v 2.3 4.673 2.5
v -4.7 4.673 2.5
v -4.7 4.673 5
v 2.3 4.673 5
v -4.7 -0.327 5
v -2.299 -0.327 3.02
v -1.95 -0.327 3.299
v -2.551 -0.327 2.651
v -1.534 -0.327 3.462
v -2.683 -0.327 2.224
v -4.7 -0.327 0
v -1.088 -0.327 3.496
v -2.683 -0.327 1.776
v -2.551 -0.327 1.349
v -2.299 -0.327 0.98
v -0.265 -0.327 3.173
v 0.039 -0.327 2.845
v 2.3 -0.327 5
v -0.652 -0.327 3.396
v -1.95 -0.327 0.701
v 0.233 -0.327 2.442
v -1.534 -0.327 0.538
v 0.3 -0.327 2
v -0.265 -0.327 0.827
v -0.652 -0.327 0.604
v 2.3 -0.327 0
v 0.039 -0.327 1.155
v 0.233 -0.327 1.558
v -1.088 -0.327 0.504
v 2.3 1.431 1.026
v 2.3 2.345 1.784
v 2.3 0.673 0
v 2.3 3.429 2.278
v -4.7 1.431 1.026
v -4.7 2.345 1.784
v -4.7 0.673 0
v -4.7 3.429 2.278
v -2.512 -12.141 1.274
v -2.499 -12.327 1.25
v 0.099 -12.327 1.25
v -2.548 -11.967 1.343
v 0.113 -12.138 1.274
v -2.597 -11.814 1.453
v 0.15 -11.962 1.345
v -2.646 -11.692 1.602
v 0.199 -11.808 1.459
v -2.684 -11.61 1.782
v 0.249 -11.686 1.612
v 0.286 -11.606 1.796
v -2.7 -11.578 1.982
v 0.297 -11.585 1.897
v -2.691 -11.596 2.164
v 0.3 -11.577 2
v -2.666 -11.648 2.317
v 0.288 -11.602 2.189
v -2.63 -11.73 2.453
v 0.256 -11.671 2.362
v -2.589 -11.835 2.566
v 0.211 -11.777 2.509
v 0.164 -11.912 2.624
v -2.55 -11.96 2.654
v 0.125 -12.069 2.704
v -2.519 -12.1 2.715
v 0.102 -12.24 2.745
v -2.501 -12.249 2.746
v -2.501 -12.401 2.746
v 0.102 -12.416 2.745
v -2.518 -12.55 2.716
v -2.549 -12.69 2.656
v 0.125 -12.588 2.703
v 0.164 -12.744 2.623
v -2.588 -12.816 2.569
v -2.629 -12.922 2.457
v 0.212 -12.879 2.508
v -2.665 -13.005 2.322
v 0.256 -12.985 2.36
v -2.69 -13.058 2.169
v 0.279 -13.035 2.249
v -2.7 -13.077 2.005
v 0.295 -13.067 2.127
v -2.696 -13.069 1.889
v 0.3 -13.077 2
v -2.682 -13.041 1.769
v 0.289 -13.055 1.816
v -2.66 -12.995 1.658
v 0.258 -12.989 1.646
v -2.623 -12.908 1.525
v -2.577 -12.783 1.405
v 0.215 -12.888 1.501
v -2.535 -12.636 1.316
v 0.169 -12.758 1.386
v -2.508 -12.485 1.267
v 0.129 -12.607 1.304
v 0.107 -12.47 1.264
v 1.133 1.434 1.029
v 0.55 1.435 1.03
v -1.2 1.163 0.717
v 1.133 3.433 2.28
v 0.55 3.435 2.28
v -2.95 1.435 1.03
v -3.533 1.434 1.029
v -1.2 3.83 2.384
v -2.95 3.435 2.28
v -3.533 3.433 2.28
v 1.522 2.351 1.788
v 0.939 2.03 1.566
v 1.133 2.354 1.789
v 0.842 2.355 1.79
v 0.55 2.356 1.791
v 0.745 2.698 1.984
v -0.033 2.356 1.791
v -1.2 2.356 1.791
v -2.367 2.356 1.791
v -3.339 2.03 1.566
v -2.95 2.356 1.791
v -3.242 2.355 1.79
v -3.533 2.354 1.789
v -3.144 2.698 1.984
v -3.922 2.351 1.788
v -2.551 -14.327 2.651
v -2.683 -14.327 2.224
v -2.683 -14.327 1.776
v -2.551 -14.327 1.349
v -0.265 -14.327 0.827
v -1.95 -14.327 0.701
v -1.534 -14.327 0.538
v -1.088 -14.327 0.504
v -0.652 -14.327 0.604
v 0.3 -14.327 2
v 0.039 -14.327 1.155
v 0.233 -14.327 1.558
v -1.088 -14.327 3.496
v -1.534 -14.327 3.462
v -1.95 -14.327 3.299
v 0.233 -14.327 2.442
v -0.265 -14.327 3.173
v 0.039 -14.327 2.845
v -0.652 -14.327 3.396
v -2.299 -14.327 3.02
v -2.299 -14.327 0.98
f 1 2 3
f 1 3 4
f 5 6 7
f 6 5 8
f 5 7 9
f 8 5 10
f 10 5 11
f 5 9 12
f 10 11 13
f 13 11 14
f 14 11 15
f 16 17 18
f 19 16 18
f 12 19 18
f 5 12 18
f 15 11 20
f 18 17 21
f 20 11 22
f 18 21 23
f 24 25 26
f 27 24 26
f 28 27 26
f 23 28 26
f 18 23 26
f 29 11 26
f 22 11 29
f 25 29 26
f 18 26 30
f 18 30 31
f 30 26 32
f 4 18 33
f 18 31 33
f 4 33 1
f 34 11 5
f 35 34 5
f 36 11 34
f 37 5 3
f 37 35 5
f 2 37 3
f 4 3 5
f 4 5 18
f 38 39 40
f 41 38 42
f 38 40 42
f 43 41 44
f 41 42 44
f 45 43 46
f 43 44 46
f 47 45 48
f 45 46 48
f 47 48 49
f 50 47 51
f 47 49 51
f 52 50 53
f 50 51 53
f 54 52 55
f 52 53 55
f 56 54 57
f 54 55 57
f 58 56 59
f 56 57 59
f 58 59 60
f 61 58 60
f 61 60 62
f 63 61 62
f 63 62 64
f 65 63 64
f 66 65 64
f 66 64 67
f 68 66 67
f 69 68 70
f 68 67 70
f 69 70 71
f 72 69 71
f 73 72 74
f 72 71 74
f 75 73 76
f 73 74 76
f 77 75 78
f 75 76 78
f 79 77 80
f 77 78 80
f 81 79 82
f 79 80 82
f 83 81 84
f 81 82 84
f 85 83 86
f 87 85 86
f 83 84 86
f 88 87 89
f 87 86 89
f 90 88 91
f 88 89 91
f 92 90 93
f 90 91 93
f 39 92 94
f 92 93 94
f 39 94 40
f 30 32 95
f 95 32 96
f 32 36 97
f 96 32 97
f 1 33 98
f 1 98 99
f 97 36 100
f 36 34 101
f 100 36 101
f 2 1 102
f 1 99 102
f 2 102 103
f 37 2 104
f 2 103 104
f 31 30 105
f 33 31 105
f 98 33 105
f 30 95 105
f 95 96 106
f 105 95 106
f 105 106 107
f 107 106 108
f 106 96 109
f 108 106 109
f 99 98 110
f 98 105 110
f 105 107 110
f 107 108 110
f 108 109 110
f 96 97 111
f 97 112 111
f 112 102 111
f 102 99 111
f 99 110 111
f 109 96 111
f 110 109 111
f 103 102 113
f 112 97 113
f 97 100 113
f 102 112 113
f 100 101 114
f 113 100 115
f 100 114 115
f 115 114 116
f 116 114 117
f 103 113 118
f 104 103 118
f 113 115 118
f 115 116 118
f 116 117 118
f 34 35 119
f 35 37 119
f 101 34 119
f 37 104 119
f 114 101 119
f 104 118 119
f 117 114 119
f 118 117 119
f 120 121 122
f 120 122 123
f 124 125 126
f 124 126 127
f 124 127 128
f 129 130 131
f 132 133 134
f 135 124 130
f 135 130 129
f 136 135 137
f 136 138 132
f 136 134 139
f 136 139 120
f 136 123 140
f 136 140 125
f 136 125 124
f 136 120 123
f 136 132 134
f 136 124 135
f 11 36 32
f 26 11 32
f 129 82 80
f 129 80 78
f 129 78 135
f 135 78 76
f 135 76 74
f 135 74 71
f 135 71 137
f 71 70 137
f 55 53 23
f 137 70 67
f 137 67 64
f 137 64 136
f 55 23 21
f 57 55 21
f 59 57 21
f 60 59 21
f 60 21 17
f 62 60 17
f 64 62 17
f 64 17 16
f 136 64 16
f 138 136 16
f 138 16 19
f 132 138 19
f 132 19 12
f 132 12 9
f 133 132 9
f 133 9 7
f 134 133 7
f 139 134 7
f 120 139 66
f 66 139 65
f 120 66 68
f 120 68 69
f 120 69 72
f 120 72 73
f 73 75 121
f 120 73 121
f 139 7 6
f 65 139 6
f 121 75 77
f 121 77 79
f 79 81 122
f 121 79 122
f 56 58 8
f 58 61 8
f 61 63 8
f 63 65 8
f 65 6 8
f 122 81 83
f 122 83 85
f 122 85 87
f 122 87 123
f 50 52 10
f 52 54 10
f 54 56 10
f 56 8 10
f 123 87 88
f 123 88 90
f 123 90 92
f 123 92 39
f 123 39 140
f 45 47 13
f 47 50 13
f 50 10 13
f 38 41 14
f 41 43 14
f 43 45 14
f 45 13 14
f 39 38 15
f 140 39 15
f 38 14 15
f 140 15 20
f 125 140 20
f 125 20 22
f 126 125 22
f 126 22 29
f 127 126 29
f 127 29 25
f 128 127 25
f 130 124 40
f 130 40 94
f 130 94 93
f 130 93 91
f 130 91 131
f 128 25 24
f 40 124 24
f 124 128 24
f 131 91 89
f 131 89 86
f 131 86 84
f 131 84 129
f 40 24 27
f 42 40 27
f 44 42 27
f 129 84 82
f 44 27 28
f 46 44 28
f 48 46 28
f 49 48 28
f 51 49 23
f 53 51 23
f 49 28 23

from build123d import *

# Parameters (mm, degrees)
SKETCH1_W             = 7
SKETCH1_H             = 5
BOSS_EXTRUDE1_DEPTH   = 5
CUT_EXTRUDE1_DEPTH    = 7
SKETCH4_R             = 1.5
BOSS_EXTRUDE3_DEPTH   = 14
F_1_5MM_DOWEL_HOLE2_D = 1.5


with BuildPart() as part:
    # Sketch1 → Boss-Extrude1 (new body)
    with BuildSketch(Plane.XY):
        with Locations((-1.19986884, 2.172533045)):
            Rectangle(SKETCH1_W, SKETCH1_H)
    extrude(amount=BOSS_EXTRUDE1_DEPTH)

    # Sketch2 → Cut-Extrude1 (cut)
    with BuildSketch(Plane.ZY.offset(4.69986884)):
        with BuildLine():
            Line((2.5, 4.672533045), (0, 4.672533045))
            Line((0, 4.672533045), (0, 0.672533045))
            add(Edge.make_bspline(
                [(0, 0.672533045), (2.331009943, 2.039673482), (2.5, 4.672533045)],
                knots=[0, 0, 0, 1, 1, 1], degree=2))
        make_face()
    extrude(amount=-CUT_EXTRUDE1_DEPTH, mode=Mode.SUBTRACT)

    # Sketch4 → Boss-Extrude3 (add)
    with BuildSketch(Plane.XZ.offset(0.327466955)):
        with Locations((-1.19986884, 2)):
            Circle(SKETCH4_R)
    extrude(amount=BOSS_EXTRUDE3_DEPTH)

    # Ø1.5mm Dowel Hole2 (through all)
    with Locations(Plane.ZY.offset(4.69986884)):
        with Locations((2, -12.327466955)):
            Hole(F_1_5MM_DOWEL_HOLE2_D / 2)


solid = part.part
